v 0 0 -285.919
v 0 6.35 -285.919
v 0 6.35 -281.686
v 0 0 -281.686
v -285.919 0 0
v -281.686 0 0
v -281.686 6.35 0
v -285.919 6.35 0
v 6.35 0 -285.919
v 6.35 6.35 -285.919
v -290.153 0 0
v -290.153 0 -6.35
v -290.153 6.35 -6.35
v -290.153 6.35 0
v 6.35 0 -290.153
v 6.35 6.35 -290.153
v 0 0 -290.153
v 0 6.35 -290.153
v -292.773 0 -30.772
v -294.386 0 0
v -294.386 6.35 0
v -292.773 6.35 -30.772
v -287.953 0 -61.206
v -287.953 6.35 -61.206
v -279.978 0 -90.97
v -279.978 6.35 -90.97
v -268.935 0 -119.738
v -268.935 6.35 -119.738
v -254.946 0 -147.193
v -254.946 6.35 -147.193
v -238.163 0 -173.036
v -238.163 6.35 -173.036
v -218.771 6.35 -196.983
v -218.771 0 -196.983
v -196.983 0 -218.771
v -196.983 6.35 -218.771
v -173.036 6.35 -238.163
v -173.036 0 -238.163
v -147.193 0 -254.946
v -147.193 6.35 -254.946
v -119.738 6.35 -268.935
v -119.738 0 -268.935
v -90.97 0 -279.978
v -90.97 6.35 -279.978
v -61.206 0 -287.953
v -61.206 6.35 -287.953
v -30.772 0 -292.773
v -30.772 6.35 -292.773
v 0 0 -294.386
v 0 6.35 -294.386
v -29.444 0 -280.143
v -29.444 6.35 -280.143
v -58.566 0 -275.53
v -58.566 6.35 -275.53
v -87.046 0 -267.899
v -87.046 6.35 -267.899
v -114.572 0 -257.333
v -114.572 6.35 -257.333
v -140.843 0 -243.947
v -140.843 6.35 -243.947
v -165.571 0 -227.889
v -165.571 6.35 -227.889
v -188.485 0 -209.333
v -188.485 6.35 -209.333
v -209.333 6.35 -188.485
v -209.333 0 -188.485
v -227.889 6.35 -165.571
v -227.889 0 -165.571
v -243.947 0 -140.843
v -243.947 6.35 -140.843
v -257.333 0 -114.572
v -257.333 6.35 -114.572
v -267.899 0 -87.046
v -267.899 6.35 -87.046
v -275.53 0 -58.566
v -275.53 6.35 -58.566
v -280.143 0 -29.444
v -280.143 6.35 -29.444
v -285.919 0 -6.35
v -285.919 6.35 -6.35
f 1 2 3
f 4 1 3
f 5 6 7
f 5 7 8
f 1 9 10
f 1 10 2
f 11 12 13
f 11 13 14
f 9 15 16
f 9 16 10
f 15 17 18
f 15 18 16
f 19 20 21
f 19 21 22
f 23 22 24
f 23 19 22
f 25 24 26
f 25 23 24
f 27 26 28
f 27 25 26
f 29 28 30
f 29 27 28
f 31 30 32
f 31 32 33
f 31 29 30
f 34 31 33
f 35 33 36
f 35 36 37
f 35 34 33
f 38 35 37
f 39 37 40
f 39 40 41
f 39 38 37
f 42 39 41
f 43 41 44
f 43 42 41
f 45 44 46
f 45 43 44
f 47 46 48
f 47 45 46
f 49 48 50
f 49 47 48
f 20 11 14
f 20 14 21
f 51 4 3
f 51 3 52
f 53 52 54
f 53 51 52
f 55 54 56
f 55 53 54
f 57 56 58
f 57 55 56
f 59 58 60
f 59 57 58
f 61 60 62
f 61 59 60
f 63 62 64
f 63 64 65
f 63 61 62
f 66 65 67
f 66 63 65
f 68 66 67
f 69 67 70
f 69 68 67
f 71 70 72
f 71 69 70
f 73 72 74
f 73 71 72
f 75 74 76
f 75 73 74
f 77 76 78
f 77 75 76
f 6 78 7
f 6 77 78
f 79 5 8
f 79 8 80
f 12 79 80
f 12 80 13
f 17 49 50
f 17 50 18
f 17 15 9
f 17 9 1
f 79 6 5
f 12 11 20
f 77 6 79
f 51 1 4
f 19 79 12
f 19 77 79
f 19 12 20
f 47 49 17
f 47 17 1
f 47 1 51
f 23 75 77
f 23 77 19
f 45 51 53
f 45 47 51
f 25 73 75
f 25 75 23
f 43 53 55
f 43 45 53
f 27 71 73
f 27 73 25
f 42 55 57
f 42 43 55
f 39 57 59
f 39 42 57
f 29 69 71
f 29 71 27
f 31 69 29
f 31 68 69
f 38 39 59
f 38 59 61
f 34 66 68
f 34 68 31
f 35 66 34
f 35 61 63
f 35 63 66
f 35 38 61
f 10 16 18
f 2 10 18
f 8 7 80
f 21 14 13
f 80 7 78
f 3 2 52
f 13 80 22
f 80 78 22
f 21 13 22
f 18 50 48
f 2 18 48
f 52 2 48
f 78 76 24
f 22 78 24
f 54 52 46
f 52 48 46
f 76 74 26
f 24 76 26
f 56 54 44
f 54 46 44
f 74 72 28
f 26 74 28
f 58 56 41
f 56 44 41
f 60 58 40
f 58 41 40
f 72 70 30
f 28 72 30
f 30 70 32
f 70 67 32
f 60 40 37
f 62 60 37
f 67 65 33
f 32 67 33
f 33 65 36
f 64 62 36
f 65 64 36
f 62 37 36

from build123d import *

# Parameters (mm, degrees)
BOSS_EXTRUDE1_DEPTH = 6.35


with BuildPart() as part:
    # Sketch1 → Boss-Extrude1 (new body)
    with BuildSketch(Plane(origin=(0, 0, 0), x_dir=(1, 0, 0), z_dir=(0, 1, 0))):
        with BuildLine():
            Line((0, 294.386), (0, 290.152666667))
            Line((0, 290.152666667), (6.35, 290.152666667))
            Line((6.35, 290.152666667), (6.35, 285.919333333))
            Line((6.35, 285.919333333), (0, 285.919333333))
            Line((0, 285.919333333), (0, 281.686))
            ThreePointArc((0, 281.686), (-199.182080765, 199.182080765), (-281.686, 0))
            Line((-281.686, 0), (-285.919333333, 0))
            Line((-285.919333333, 0), (-285.919333333, 6.35))
            Line((-285.919333333, 6.35), (-290.152666667, 6.35))
            Line((-290.152666667, 6.35), (-290.152666667, 0))
            Line((-290.152666667, 0), (-294.386, 0))
            ThreePointArc((-294.386, 0), (-208.162336886, 208.162336886), (0, 294.386))
        make_face()
    extrude(amount=BOSS_EXTRUDE1_DEPTH)


solid = part.part
